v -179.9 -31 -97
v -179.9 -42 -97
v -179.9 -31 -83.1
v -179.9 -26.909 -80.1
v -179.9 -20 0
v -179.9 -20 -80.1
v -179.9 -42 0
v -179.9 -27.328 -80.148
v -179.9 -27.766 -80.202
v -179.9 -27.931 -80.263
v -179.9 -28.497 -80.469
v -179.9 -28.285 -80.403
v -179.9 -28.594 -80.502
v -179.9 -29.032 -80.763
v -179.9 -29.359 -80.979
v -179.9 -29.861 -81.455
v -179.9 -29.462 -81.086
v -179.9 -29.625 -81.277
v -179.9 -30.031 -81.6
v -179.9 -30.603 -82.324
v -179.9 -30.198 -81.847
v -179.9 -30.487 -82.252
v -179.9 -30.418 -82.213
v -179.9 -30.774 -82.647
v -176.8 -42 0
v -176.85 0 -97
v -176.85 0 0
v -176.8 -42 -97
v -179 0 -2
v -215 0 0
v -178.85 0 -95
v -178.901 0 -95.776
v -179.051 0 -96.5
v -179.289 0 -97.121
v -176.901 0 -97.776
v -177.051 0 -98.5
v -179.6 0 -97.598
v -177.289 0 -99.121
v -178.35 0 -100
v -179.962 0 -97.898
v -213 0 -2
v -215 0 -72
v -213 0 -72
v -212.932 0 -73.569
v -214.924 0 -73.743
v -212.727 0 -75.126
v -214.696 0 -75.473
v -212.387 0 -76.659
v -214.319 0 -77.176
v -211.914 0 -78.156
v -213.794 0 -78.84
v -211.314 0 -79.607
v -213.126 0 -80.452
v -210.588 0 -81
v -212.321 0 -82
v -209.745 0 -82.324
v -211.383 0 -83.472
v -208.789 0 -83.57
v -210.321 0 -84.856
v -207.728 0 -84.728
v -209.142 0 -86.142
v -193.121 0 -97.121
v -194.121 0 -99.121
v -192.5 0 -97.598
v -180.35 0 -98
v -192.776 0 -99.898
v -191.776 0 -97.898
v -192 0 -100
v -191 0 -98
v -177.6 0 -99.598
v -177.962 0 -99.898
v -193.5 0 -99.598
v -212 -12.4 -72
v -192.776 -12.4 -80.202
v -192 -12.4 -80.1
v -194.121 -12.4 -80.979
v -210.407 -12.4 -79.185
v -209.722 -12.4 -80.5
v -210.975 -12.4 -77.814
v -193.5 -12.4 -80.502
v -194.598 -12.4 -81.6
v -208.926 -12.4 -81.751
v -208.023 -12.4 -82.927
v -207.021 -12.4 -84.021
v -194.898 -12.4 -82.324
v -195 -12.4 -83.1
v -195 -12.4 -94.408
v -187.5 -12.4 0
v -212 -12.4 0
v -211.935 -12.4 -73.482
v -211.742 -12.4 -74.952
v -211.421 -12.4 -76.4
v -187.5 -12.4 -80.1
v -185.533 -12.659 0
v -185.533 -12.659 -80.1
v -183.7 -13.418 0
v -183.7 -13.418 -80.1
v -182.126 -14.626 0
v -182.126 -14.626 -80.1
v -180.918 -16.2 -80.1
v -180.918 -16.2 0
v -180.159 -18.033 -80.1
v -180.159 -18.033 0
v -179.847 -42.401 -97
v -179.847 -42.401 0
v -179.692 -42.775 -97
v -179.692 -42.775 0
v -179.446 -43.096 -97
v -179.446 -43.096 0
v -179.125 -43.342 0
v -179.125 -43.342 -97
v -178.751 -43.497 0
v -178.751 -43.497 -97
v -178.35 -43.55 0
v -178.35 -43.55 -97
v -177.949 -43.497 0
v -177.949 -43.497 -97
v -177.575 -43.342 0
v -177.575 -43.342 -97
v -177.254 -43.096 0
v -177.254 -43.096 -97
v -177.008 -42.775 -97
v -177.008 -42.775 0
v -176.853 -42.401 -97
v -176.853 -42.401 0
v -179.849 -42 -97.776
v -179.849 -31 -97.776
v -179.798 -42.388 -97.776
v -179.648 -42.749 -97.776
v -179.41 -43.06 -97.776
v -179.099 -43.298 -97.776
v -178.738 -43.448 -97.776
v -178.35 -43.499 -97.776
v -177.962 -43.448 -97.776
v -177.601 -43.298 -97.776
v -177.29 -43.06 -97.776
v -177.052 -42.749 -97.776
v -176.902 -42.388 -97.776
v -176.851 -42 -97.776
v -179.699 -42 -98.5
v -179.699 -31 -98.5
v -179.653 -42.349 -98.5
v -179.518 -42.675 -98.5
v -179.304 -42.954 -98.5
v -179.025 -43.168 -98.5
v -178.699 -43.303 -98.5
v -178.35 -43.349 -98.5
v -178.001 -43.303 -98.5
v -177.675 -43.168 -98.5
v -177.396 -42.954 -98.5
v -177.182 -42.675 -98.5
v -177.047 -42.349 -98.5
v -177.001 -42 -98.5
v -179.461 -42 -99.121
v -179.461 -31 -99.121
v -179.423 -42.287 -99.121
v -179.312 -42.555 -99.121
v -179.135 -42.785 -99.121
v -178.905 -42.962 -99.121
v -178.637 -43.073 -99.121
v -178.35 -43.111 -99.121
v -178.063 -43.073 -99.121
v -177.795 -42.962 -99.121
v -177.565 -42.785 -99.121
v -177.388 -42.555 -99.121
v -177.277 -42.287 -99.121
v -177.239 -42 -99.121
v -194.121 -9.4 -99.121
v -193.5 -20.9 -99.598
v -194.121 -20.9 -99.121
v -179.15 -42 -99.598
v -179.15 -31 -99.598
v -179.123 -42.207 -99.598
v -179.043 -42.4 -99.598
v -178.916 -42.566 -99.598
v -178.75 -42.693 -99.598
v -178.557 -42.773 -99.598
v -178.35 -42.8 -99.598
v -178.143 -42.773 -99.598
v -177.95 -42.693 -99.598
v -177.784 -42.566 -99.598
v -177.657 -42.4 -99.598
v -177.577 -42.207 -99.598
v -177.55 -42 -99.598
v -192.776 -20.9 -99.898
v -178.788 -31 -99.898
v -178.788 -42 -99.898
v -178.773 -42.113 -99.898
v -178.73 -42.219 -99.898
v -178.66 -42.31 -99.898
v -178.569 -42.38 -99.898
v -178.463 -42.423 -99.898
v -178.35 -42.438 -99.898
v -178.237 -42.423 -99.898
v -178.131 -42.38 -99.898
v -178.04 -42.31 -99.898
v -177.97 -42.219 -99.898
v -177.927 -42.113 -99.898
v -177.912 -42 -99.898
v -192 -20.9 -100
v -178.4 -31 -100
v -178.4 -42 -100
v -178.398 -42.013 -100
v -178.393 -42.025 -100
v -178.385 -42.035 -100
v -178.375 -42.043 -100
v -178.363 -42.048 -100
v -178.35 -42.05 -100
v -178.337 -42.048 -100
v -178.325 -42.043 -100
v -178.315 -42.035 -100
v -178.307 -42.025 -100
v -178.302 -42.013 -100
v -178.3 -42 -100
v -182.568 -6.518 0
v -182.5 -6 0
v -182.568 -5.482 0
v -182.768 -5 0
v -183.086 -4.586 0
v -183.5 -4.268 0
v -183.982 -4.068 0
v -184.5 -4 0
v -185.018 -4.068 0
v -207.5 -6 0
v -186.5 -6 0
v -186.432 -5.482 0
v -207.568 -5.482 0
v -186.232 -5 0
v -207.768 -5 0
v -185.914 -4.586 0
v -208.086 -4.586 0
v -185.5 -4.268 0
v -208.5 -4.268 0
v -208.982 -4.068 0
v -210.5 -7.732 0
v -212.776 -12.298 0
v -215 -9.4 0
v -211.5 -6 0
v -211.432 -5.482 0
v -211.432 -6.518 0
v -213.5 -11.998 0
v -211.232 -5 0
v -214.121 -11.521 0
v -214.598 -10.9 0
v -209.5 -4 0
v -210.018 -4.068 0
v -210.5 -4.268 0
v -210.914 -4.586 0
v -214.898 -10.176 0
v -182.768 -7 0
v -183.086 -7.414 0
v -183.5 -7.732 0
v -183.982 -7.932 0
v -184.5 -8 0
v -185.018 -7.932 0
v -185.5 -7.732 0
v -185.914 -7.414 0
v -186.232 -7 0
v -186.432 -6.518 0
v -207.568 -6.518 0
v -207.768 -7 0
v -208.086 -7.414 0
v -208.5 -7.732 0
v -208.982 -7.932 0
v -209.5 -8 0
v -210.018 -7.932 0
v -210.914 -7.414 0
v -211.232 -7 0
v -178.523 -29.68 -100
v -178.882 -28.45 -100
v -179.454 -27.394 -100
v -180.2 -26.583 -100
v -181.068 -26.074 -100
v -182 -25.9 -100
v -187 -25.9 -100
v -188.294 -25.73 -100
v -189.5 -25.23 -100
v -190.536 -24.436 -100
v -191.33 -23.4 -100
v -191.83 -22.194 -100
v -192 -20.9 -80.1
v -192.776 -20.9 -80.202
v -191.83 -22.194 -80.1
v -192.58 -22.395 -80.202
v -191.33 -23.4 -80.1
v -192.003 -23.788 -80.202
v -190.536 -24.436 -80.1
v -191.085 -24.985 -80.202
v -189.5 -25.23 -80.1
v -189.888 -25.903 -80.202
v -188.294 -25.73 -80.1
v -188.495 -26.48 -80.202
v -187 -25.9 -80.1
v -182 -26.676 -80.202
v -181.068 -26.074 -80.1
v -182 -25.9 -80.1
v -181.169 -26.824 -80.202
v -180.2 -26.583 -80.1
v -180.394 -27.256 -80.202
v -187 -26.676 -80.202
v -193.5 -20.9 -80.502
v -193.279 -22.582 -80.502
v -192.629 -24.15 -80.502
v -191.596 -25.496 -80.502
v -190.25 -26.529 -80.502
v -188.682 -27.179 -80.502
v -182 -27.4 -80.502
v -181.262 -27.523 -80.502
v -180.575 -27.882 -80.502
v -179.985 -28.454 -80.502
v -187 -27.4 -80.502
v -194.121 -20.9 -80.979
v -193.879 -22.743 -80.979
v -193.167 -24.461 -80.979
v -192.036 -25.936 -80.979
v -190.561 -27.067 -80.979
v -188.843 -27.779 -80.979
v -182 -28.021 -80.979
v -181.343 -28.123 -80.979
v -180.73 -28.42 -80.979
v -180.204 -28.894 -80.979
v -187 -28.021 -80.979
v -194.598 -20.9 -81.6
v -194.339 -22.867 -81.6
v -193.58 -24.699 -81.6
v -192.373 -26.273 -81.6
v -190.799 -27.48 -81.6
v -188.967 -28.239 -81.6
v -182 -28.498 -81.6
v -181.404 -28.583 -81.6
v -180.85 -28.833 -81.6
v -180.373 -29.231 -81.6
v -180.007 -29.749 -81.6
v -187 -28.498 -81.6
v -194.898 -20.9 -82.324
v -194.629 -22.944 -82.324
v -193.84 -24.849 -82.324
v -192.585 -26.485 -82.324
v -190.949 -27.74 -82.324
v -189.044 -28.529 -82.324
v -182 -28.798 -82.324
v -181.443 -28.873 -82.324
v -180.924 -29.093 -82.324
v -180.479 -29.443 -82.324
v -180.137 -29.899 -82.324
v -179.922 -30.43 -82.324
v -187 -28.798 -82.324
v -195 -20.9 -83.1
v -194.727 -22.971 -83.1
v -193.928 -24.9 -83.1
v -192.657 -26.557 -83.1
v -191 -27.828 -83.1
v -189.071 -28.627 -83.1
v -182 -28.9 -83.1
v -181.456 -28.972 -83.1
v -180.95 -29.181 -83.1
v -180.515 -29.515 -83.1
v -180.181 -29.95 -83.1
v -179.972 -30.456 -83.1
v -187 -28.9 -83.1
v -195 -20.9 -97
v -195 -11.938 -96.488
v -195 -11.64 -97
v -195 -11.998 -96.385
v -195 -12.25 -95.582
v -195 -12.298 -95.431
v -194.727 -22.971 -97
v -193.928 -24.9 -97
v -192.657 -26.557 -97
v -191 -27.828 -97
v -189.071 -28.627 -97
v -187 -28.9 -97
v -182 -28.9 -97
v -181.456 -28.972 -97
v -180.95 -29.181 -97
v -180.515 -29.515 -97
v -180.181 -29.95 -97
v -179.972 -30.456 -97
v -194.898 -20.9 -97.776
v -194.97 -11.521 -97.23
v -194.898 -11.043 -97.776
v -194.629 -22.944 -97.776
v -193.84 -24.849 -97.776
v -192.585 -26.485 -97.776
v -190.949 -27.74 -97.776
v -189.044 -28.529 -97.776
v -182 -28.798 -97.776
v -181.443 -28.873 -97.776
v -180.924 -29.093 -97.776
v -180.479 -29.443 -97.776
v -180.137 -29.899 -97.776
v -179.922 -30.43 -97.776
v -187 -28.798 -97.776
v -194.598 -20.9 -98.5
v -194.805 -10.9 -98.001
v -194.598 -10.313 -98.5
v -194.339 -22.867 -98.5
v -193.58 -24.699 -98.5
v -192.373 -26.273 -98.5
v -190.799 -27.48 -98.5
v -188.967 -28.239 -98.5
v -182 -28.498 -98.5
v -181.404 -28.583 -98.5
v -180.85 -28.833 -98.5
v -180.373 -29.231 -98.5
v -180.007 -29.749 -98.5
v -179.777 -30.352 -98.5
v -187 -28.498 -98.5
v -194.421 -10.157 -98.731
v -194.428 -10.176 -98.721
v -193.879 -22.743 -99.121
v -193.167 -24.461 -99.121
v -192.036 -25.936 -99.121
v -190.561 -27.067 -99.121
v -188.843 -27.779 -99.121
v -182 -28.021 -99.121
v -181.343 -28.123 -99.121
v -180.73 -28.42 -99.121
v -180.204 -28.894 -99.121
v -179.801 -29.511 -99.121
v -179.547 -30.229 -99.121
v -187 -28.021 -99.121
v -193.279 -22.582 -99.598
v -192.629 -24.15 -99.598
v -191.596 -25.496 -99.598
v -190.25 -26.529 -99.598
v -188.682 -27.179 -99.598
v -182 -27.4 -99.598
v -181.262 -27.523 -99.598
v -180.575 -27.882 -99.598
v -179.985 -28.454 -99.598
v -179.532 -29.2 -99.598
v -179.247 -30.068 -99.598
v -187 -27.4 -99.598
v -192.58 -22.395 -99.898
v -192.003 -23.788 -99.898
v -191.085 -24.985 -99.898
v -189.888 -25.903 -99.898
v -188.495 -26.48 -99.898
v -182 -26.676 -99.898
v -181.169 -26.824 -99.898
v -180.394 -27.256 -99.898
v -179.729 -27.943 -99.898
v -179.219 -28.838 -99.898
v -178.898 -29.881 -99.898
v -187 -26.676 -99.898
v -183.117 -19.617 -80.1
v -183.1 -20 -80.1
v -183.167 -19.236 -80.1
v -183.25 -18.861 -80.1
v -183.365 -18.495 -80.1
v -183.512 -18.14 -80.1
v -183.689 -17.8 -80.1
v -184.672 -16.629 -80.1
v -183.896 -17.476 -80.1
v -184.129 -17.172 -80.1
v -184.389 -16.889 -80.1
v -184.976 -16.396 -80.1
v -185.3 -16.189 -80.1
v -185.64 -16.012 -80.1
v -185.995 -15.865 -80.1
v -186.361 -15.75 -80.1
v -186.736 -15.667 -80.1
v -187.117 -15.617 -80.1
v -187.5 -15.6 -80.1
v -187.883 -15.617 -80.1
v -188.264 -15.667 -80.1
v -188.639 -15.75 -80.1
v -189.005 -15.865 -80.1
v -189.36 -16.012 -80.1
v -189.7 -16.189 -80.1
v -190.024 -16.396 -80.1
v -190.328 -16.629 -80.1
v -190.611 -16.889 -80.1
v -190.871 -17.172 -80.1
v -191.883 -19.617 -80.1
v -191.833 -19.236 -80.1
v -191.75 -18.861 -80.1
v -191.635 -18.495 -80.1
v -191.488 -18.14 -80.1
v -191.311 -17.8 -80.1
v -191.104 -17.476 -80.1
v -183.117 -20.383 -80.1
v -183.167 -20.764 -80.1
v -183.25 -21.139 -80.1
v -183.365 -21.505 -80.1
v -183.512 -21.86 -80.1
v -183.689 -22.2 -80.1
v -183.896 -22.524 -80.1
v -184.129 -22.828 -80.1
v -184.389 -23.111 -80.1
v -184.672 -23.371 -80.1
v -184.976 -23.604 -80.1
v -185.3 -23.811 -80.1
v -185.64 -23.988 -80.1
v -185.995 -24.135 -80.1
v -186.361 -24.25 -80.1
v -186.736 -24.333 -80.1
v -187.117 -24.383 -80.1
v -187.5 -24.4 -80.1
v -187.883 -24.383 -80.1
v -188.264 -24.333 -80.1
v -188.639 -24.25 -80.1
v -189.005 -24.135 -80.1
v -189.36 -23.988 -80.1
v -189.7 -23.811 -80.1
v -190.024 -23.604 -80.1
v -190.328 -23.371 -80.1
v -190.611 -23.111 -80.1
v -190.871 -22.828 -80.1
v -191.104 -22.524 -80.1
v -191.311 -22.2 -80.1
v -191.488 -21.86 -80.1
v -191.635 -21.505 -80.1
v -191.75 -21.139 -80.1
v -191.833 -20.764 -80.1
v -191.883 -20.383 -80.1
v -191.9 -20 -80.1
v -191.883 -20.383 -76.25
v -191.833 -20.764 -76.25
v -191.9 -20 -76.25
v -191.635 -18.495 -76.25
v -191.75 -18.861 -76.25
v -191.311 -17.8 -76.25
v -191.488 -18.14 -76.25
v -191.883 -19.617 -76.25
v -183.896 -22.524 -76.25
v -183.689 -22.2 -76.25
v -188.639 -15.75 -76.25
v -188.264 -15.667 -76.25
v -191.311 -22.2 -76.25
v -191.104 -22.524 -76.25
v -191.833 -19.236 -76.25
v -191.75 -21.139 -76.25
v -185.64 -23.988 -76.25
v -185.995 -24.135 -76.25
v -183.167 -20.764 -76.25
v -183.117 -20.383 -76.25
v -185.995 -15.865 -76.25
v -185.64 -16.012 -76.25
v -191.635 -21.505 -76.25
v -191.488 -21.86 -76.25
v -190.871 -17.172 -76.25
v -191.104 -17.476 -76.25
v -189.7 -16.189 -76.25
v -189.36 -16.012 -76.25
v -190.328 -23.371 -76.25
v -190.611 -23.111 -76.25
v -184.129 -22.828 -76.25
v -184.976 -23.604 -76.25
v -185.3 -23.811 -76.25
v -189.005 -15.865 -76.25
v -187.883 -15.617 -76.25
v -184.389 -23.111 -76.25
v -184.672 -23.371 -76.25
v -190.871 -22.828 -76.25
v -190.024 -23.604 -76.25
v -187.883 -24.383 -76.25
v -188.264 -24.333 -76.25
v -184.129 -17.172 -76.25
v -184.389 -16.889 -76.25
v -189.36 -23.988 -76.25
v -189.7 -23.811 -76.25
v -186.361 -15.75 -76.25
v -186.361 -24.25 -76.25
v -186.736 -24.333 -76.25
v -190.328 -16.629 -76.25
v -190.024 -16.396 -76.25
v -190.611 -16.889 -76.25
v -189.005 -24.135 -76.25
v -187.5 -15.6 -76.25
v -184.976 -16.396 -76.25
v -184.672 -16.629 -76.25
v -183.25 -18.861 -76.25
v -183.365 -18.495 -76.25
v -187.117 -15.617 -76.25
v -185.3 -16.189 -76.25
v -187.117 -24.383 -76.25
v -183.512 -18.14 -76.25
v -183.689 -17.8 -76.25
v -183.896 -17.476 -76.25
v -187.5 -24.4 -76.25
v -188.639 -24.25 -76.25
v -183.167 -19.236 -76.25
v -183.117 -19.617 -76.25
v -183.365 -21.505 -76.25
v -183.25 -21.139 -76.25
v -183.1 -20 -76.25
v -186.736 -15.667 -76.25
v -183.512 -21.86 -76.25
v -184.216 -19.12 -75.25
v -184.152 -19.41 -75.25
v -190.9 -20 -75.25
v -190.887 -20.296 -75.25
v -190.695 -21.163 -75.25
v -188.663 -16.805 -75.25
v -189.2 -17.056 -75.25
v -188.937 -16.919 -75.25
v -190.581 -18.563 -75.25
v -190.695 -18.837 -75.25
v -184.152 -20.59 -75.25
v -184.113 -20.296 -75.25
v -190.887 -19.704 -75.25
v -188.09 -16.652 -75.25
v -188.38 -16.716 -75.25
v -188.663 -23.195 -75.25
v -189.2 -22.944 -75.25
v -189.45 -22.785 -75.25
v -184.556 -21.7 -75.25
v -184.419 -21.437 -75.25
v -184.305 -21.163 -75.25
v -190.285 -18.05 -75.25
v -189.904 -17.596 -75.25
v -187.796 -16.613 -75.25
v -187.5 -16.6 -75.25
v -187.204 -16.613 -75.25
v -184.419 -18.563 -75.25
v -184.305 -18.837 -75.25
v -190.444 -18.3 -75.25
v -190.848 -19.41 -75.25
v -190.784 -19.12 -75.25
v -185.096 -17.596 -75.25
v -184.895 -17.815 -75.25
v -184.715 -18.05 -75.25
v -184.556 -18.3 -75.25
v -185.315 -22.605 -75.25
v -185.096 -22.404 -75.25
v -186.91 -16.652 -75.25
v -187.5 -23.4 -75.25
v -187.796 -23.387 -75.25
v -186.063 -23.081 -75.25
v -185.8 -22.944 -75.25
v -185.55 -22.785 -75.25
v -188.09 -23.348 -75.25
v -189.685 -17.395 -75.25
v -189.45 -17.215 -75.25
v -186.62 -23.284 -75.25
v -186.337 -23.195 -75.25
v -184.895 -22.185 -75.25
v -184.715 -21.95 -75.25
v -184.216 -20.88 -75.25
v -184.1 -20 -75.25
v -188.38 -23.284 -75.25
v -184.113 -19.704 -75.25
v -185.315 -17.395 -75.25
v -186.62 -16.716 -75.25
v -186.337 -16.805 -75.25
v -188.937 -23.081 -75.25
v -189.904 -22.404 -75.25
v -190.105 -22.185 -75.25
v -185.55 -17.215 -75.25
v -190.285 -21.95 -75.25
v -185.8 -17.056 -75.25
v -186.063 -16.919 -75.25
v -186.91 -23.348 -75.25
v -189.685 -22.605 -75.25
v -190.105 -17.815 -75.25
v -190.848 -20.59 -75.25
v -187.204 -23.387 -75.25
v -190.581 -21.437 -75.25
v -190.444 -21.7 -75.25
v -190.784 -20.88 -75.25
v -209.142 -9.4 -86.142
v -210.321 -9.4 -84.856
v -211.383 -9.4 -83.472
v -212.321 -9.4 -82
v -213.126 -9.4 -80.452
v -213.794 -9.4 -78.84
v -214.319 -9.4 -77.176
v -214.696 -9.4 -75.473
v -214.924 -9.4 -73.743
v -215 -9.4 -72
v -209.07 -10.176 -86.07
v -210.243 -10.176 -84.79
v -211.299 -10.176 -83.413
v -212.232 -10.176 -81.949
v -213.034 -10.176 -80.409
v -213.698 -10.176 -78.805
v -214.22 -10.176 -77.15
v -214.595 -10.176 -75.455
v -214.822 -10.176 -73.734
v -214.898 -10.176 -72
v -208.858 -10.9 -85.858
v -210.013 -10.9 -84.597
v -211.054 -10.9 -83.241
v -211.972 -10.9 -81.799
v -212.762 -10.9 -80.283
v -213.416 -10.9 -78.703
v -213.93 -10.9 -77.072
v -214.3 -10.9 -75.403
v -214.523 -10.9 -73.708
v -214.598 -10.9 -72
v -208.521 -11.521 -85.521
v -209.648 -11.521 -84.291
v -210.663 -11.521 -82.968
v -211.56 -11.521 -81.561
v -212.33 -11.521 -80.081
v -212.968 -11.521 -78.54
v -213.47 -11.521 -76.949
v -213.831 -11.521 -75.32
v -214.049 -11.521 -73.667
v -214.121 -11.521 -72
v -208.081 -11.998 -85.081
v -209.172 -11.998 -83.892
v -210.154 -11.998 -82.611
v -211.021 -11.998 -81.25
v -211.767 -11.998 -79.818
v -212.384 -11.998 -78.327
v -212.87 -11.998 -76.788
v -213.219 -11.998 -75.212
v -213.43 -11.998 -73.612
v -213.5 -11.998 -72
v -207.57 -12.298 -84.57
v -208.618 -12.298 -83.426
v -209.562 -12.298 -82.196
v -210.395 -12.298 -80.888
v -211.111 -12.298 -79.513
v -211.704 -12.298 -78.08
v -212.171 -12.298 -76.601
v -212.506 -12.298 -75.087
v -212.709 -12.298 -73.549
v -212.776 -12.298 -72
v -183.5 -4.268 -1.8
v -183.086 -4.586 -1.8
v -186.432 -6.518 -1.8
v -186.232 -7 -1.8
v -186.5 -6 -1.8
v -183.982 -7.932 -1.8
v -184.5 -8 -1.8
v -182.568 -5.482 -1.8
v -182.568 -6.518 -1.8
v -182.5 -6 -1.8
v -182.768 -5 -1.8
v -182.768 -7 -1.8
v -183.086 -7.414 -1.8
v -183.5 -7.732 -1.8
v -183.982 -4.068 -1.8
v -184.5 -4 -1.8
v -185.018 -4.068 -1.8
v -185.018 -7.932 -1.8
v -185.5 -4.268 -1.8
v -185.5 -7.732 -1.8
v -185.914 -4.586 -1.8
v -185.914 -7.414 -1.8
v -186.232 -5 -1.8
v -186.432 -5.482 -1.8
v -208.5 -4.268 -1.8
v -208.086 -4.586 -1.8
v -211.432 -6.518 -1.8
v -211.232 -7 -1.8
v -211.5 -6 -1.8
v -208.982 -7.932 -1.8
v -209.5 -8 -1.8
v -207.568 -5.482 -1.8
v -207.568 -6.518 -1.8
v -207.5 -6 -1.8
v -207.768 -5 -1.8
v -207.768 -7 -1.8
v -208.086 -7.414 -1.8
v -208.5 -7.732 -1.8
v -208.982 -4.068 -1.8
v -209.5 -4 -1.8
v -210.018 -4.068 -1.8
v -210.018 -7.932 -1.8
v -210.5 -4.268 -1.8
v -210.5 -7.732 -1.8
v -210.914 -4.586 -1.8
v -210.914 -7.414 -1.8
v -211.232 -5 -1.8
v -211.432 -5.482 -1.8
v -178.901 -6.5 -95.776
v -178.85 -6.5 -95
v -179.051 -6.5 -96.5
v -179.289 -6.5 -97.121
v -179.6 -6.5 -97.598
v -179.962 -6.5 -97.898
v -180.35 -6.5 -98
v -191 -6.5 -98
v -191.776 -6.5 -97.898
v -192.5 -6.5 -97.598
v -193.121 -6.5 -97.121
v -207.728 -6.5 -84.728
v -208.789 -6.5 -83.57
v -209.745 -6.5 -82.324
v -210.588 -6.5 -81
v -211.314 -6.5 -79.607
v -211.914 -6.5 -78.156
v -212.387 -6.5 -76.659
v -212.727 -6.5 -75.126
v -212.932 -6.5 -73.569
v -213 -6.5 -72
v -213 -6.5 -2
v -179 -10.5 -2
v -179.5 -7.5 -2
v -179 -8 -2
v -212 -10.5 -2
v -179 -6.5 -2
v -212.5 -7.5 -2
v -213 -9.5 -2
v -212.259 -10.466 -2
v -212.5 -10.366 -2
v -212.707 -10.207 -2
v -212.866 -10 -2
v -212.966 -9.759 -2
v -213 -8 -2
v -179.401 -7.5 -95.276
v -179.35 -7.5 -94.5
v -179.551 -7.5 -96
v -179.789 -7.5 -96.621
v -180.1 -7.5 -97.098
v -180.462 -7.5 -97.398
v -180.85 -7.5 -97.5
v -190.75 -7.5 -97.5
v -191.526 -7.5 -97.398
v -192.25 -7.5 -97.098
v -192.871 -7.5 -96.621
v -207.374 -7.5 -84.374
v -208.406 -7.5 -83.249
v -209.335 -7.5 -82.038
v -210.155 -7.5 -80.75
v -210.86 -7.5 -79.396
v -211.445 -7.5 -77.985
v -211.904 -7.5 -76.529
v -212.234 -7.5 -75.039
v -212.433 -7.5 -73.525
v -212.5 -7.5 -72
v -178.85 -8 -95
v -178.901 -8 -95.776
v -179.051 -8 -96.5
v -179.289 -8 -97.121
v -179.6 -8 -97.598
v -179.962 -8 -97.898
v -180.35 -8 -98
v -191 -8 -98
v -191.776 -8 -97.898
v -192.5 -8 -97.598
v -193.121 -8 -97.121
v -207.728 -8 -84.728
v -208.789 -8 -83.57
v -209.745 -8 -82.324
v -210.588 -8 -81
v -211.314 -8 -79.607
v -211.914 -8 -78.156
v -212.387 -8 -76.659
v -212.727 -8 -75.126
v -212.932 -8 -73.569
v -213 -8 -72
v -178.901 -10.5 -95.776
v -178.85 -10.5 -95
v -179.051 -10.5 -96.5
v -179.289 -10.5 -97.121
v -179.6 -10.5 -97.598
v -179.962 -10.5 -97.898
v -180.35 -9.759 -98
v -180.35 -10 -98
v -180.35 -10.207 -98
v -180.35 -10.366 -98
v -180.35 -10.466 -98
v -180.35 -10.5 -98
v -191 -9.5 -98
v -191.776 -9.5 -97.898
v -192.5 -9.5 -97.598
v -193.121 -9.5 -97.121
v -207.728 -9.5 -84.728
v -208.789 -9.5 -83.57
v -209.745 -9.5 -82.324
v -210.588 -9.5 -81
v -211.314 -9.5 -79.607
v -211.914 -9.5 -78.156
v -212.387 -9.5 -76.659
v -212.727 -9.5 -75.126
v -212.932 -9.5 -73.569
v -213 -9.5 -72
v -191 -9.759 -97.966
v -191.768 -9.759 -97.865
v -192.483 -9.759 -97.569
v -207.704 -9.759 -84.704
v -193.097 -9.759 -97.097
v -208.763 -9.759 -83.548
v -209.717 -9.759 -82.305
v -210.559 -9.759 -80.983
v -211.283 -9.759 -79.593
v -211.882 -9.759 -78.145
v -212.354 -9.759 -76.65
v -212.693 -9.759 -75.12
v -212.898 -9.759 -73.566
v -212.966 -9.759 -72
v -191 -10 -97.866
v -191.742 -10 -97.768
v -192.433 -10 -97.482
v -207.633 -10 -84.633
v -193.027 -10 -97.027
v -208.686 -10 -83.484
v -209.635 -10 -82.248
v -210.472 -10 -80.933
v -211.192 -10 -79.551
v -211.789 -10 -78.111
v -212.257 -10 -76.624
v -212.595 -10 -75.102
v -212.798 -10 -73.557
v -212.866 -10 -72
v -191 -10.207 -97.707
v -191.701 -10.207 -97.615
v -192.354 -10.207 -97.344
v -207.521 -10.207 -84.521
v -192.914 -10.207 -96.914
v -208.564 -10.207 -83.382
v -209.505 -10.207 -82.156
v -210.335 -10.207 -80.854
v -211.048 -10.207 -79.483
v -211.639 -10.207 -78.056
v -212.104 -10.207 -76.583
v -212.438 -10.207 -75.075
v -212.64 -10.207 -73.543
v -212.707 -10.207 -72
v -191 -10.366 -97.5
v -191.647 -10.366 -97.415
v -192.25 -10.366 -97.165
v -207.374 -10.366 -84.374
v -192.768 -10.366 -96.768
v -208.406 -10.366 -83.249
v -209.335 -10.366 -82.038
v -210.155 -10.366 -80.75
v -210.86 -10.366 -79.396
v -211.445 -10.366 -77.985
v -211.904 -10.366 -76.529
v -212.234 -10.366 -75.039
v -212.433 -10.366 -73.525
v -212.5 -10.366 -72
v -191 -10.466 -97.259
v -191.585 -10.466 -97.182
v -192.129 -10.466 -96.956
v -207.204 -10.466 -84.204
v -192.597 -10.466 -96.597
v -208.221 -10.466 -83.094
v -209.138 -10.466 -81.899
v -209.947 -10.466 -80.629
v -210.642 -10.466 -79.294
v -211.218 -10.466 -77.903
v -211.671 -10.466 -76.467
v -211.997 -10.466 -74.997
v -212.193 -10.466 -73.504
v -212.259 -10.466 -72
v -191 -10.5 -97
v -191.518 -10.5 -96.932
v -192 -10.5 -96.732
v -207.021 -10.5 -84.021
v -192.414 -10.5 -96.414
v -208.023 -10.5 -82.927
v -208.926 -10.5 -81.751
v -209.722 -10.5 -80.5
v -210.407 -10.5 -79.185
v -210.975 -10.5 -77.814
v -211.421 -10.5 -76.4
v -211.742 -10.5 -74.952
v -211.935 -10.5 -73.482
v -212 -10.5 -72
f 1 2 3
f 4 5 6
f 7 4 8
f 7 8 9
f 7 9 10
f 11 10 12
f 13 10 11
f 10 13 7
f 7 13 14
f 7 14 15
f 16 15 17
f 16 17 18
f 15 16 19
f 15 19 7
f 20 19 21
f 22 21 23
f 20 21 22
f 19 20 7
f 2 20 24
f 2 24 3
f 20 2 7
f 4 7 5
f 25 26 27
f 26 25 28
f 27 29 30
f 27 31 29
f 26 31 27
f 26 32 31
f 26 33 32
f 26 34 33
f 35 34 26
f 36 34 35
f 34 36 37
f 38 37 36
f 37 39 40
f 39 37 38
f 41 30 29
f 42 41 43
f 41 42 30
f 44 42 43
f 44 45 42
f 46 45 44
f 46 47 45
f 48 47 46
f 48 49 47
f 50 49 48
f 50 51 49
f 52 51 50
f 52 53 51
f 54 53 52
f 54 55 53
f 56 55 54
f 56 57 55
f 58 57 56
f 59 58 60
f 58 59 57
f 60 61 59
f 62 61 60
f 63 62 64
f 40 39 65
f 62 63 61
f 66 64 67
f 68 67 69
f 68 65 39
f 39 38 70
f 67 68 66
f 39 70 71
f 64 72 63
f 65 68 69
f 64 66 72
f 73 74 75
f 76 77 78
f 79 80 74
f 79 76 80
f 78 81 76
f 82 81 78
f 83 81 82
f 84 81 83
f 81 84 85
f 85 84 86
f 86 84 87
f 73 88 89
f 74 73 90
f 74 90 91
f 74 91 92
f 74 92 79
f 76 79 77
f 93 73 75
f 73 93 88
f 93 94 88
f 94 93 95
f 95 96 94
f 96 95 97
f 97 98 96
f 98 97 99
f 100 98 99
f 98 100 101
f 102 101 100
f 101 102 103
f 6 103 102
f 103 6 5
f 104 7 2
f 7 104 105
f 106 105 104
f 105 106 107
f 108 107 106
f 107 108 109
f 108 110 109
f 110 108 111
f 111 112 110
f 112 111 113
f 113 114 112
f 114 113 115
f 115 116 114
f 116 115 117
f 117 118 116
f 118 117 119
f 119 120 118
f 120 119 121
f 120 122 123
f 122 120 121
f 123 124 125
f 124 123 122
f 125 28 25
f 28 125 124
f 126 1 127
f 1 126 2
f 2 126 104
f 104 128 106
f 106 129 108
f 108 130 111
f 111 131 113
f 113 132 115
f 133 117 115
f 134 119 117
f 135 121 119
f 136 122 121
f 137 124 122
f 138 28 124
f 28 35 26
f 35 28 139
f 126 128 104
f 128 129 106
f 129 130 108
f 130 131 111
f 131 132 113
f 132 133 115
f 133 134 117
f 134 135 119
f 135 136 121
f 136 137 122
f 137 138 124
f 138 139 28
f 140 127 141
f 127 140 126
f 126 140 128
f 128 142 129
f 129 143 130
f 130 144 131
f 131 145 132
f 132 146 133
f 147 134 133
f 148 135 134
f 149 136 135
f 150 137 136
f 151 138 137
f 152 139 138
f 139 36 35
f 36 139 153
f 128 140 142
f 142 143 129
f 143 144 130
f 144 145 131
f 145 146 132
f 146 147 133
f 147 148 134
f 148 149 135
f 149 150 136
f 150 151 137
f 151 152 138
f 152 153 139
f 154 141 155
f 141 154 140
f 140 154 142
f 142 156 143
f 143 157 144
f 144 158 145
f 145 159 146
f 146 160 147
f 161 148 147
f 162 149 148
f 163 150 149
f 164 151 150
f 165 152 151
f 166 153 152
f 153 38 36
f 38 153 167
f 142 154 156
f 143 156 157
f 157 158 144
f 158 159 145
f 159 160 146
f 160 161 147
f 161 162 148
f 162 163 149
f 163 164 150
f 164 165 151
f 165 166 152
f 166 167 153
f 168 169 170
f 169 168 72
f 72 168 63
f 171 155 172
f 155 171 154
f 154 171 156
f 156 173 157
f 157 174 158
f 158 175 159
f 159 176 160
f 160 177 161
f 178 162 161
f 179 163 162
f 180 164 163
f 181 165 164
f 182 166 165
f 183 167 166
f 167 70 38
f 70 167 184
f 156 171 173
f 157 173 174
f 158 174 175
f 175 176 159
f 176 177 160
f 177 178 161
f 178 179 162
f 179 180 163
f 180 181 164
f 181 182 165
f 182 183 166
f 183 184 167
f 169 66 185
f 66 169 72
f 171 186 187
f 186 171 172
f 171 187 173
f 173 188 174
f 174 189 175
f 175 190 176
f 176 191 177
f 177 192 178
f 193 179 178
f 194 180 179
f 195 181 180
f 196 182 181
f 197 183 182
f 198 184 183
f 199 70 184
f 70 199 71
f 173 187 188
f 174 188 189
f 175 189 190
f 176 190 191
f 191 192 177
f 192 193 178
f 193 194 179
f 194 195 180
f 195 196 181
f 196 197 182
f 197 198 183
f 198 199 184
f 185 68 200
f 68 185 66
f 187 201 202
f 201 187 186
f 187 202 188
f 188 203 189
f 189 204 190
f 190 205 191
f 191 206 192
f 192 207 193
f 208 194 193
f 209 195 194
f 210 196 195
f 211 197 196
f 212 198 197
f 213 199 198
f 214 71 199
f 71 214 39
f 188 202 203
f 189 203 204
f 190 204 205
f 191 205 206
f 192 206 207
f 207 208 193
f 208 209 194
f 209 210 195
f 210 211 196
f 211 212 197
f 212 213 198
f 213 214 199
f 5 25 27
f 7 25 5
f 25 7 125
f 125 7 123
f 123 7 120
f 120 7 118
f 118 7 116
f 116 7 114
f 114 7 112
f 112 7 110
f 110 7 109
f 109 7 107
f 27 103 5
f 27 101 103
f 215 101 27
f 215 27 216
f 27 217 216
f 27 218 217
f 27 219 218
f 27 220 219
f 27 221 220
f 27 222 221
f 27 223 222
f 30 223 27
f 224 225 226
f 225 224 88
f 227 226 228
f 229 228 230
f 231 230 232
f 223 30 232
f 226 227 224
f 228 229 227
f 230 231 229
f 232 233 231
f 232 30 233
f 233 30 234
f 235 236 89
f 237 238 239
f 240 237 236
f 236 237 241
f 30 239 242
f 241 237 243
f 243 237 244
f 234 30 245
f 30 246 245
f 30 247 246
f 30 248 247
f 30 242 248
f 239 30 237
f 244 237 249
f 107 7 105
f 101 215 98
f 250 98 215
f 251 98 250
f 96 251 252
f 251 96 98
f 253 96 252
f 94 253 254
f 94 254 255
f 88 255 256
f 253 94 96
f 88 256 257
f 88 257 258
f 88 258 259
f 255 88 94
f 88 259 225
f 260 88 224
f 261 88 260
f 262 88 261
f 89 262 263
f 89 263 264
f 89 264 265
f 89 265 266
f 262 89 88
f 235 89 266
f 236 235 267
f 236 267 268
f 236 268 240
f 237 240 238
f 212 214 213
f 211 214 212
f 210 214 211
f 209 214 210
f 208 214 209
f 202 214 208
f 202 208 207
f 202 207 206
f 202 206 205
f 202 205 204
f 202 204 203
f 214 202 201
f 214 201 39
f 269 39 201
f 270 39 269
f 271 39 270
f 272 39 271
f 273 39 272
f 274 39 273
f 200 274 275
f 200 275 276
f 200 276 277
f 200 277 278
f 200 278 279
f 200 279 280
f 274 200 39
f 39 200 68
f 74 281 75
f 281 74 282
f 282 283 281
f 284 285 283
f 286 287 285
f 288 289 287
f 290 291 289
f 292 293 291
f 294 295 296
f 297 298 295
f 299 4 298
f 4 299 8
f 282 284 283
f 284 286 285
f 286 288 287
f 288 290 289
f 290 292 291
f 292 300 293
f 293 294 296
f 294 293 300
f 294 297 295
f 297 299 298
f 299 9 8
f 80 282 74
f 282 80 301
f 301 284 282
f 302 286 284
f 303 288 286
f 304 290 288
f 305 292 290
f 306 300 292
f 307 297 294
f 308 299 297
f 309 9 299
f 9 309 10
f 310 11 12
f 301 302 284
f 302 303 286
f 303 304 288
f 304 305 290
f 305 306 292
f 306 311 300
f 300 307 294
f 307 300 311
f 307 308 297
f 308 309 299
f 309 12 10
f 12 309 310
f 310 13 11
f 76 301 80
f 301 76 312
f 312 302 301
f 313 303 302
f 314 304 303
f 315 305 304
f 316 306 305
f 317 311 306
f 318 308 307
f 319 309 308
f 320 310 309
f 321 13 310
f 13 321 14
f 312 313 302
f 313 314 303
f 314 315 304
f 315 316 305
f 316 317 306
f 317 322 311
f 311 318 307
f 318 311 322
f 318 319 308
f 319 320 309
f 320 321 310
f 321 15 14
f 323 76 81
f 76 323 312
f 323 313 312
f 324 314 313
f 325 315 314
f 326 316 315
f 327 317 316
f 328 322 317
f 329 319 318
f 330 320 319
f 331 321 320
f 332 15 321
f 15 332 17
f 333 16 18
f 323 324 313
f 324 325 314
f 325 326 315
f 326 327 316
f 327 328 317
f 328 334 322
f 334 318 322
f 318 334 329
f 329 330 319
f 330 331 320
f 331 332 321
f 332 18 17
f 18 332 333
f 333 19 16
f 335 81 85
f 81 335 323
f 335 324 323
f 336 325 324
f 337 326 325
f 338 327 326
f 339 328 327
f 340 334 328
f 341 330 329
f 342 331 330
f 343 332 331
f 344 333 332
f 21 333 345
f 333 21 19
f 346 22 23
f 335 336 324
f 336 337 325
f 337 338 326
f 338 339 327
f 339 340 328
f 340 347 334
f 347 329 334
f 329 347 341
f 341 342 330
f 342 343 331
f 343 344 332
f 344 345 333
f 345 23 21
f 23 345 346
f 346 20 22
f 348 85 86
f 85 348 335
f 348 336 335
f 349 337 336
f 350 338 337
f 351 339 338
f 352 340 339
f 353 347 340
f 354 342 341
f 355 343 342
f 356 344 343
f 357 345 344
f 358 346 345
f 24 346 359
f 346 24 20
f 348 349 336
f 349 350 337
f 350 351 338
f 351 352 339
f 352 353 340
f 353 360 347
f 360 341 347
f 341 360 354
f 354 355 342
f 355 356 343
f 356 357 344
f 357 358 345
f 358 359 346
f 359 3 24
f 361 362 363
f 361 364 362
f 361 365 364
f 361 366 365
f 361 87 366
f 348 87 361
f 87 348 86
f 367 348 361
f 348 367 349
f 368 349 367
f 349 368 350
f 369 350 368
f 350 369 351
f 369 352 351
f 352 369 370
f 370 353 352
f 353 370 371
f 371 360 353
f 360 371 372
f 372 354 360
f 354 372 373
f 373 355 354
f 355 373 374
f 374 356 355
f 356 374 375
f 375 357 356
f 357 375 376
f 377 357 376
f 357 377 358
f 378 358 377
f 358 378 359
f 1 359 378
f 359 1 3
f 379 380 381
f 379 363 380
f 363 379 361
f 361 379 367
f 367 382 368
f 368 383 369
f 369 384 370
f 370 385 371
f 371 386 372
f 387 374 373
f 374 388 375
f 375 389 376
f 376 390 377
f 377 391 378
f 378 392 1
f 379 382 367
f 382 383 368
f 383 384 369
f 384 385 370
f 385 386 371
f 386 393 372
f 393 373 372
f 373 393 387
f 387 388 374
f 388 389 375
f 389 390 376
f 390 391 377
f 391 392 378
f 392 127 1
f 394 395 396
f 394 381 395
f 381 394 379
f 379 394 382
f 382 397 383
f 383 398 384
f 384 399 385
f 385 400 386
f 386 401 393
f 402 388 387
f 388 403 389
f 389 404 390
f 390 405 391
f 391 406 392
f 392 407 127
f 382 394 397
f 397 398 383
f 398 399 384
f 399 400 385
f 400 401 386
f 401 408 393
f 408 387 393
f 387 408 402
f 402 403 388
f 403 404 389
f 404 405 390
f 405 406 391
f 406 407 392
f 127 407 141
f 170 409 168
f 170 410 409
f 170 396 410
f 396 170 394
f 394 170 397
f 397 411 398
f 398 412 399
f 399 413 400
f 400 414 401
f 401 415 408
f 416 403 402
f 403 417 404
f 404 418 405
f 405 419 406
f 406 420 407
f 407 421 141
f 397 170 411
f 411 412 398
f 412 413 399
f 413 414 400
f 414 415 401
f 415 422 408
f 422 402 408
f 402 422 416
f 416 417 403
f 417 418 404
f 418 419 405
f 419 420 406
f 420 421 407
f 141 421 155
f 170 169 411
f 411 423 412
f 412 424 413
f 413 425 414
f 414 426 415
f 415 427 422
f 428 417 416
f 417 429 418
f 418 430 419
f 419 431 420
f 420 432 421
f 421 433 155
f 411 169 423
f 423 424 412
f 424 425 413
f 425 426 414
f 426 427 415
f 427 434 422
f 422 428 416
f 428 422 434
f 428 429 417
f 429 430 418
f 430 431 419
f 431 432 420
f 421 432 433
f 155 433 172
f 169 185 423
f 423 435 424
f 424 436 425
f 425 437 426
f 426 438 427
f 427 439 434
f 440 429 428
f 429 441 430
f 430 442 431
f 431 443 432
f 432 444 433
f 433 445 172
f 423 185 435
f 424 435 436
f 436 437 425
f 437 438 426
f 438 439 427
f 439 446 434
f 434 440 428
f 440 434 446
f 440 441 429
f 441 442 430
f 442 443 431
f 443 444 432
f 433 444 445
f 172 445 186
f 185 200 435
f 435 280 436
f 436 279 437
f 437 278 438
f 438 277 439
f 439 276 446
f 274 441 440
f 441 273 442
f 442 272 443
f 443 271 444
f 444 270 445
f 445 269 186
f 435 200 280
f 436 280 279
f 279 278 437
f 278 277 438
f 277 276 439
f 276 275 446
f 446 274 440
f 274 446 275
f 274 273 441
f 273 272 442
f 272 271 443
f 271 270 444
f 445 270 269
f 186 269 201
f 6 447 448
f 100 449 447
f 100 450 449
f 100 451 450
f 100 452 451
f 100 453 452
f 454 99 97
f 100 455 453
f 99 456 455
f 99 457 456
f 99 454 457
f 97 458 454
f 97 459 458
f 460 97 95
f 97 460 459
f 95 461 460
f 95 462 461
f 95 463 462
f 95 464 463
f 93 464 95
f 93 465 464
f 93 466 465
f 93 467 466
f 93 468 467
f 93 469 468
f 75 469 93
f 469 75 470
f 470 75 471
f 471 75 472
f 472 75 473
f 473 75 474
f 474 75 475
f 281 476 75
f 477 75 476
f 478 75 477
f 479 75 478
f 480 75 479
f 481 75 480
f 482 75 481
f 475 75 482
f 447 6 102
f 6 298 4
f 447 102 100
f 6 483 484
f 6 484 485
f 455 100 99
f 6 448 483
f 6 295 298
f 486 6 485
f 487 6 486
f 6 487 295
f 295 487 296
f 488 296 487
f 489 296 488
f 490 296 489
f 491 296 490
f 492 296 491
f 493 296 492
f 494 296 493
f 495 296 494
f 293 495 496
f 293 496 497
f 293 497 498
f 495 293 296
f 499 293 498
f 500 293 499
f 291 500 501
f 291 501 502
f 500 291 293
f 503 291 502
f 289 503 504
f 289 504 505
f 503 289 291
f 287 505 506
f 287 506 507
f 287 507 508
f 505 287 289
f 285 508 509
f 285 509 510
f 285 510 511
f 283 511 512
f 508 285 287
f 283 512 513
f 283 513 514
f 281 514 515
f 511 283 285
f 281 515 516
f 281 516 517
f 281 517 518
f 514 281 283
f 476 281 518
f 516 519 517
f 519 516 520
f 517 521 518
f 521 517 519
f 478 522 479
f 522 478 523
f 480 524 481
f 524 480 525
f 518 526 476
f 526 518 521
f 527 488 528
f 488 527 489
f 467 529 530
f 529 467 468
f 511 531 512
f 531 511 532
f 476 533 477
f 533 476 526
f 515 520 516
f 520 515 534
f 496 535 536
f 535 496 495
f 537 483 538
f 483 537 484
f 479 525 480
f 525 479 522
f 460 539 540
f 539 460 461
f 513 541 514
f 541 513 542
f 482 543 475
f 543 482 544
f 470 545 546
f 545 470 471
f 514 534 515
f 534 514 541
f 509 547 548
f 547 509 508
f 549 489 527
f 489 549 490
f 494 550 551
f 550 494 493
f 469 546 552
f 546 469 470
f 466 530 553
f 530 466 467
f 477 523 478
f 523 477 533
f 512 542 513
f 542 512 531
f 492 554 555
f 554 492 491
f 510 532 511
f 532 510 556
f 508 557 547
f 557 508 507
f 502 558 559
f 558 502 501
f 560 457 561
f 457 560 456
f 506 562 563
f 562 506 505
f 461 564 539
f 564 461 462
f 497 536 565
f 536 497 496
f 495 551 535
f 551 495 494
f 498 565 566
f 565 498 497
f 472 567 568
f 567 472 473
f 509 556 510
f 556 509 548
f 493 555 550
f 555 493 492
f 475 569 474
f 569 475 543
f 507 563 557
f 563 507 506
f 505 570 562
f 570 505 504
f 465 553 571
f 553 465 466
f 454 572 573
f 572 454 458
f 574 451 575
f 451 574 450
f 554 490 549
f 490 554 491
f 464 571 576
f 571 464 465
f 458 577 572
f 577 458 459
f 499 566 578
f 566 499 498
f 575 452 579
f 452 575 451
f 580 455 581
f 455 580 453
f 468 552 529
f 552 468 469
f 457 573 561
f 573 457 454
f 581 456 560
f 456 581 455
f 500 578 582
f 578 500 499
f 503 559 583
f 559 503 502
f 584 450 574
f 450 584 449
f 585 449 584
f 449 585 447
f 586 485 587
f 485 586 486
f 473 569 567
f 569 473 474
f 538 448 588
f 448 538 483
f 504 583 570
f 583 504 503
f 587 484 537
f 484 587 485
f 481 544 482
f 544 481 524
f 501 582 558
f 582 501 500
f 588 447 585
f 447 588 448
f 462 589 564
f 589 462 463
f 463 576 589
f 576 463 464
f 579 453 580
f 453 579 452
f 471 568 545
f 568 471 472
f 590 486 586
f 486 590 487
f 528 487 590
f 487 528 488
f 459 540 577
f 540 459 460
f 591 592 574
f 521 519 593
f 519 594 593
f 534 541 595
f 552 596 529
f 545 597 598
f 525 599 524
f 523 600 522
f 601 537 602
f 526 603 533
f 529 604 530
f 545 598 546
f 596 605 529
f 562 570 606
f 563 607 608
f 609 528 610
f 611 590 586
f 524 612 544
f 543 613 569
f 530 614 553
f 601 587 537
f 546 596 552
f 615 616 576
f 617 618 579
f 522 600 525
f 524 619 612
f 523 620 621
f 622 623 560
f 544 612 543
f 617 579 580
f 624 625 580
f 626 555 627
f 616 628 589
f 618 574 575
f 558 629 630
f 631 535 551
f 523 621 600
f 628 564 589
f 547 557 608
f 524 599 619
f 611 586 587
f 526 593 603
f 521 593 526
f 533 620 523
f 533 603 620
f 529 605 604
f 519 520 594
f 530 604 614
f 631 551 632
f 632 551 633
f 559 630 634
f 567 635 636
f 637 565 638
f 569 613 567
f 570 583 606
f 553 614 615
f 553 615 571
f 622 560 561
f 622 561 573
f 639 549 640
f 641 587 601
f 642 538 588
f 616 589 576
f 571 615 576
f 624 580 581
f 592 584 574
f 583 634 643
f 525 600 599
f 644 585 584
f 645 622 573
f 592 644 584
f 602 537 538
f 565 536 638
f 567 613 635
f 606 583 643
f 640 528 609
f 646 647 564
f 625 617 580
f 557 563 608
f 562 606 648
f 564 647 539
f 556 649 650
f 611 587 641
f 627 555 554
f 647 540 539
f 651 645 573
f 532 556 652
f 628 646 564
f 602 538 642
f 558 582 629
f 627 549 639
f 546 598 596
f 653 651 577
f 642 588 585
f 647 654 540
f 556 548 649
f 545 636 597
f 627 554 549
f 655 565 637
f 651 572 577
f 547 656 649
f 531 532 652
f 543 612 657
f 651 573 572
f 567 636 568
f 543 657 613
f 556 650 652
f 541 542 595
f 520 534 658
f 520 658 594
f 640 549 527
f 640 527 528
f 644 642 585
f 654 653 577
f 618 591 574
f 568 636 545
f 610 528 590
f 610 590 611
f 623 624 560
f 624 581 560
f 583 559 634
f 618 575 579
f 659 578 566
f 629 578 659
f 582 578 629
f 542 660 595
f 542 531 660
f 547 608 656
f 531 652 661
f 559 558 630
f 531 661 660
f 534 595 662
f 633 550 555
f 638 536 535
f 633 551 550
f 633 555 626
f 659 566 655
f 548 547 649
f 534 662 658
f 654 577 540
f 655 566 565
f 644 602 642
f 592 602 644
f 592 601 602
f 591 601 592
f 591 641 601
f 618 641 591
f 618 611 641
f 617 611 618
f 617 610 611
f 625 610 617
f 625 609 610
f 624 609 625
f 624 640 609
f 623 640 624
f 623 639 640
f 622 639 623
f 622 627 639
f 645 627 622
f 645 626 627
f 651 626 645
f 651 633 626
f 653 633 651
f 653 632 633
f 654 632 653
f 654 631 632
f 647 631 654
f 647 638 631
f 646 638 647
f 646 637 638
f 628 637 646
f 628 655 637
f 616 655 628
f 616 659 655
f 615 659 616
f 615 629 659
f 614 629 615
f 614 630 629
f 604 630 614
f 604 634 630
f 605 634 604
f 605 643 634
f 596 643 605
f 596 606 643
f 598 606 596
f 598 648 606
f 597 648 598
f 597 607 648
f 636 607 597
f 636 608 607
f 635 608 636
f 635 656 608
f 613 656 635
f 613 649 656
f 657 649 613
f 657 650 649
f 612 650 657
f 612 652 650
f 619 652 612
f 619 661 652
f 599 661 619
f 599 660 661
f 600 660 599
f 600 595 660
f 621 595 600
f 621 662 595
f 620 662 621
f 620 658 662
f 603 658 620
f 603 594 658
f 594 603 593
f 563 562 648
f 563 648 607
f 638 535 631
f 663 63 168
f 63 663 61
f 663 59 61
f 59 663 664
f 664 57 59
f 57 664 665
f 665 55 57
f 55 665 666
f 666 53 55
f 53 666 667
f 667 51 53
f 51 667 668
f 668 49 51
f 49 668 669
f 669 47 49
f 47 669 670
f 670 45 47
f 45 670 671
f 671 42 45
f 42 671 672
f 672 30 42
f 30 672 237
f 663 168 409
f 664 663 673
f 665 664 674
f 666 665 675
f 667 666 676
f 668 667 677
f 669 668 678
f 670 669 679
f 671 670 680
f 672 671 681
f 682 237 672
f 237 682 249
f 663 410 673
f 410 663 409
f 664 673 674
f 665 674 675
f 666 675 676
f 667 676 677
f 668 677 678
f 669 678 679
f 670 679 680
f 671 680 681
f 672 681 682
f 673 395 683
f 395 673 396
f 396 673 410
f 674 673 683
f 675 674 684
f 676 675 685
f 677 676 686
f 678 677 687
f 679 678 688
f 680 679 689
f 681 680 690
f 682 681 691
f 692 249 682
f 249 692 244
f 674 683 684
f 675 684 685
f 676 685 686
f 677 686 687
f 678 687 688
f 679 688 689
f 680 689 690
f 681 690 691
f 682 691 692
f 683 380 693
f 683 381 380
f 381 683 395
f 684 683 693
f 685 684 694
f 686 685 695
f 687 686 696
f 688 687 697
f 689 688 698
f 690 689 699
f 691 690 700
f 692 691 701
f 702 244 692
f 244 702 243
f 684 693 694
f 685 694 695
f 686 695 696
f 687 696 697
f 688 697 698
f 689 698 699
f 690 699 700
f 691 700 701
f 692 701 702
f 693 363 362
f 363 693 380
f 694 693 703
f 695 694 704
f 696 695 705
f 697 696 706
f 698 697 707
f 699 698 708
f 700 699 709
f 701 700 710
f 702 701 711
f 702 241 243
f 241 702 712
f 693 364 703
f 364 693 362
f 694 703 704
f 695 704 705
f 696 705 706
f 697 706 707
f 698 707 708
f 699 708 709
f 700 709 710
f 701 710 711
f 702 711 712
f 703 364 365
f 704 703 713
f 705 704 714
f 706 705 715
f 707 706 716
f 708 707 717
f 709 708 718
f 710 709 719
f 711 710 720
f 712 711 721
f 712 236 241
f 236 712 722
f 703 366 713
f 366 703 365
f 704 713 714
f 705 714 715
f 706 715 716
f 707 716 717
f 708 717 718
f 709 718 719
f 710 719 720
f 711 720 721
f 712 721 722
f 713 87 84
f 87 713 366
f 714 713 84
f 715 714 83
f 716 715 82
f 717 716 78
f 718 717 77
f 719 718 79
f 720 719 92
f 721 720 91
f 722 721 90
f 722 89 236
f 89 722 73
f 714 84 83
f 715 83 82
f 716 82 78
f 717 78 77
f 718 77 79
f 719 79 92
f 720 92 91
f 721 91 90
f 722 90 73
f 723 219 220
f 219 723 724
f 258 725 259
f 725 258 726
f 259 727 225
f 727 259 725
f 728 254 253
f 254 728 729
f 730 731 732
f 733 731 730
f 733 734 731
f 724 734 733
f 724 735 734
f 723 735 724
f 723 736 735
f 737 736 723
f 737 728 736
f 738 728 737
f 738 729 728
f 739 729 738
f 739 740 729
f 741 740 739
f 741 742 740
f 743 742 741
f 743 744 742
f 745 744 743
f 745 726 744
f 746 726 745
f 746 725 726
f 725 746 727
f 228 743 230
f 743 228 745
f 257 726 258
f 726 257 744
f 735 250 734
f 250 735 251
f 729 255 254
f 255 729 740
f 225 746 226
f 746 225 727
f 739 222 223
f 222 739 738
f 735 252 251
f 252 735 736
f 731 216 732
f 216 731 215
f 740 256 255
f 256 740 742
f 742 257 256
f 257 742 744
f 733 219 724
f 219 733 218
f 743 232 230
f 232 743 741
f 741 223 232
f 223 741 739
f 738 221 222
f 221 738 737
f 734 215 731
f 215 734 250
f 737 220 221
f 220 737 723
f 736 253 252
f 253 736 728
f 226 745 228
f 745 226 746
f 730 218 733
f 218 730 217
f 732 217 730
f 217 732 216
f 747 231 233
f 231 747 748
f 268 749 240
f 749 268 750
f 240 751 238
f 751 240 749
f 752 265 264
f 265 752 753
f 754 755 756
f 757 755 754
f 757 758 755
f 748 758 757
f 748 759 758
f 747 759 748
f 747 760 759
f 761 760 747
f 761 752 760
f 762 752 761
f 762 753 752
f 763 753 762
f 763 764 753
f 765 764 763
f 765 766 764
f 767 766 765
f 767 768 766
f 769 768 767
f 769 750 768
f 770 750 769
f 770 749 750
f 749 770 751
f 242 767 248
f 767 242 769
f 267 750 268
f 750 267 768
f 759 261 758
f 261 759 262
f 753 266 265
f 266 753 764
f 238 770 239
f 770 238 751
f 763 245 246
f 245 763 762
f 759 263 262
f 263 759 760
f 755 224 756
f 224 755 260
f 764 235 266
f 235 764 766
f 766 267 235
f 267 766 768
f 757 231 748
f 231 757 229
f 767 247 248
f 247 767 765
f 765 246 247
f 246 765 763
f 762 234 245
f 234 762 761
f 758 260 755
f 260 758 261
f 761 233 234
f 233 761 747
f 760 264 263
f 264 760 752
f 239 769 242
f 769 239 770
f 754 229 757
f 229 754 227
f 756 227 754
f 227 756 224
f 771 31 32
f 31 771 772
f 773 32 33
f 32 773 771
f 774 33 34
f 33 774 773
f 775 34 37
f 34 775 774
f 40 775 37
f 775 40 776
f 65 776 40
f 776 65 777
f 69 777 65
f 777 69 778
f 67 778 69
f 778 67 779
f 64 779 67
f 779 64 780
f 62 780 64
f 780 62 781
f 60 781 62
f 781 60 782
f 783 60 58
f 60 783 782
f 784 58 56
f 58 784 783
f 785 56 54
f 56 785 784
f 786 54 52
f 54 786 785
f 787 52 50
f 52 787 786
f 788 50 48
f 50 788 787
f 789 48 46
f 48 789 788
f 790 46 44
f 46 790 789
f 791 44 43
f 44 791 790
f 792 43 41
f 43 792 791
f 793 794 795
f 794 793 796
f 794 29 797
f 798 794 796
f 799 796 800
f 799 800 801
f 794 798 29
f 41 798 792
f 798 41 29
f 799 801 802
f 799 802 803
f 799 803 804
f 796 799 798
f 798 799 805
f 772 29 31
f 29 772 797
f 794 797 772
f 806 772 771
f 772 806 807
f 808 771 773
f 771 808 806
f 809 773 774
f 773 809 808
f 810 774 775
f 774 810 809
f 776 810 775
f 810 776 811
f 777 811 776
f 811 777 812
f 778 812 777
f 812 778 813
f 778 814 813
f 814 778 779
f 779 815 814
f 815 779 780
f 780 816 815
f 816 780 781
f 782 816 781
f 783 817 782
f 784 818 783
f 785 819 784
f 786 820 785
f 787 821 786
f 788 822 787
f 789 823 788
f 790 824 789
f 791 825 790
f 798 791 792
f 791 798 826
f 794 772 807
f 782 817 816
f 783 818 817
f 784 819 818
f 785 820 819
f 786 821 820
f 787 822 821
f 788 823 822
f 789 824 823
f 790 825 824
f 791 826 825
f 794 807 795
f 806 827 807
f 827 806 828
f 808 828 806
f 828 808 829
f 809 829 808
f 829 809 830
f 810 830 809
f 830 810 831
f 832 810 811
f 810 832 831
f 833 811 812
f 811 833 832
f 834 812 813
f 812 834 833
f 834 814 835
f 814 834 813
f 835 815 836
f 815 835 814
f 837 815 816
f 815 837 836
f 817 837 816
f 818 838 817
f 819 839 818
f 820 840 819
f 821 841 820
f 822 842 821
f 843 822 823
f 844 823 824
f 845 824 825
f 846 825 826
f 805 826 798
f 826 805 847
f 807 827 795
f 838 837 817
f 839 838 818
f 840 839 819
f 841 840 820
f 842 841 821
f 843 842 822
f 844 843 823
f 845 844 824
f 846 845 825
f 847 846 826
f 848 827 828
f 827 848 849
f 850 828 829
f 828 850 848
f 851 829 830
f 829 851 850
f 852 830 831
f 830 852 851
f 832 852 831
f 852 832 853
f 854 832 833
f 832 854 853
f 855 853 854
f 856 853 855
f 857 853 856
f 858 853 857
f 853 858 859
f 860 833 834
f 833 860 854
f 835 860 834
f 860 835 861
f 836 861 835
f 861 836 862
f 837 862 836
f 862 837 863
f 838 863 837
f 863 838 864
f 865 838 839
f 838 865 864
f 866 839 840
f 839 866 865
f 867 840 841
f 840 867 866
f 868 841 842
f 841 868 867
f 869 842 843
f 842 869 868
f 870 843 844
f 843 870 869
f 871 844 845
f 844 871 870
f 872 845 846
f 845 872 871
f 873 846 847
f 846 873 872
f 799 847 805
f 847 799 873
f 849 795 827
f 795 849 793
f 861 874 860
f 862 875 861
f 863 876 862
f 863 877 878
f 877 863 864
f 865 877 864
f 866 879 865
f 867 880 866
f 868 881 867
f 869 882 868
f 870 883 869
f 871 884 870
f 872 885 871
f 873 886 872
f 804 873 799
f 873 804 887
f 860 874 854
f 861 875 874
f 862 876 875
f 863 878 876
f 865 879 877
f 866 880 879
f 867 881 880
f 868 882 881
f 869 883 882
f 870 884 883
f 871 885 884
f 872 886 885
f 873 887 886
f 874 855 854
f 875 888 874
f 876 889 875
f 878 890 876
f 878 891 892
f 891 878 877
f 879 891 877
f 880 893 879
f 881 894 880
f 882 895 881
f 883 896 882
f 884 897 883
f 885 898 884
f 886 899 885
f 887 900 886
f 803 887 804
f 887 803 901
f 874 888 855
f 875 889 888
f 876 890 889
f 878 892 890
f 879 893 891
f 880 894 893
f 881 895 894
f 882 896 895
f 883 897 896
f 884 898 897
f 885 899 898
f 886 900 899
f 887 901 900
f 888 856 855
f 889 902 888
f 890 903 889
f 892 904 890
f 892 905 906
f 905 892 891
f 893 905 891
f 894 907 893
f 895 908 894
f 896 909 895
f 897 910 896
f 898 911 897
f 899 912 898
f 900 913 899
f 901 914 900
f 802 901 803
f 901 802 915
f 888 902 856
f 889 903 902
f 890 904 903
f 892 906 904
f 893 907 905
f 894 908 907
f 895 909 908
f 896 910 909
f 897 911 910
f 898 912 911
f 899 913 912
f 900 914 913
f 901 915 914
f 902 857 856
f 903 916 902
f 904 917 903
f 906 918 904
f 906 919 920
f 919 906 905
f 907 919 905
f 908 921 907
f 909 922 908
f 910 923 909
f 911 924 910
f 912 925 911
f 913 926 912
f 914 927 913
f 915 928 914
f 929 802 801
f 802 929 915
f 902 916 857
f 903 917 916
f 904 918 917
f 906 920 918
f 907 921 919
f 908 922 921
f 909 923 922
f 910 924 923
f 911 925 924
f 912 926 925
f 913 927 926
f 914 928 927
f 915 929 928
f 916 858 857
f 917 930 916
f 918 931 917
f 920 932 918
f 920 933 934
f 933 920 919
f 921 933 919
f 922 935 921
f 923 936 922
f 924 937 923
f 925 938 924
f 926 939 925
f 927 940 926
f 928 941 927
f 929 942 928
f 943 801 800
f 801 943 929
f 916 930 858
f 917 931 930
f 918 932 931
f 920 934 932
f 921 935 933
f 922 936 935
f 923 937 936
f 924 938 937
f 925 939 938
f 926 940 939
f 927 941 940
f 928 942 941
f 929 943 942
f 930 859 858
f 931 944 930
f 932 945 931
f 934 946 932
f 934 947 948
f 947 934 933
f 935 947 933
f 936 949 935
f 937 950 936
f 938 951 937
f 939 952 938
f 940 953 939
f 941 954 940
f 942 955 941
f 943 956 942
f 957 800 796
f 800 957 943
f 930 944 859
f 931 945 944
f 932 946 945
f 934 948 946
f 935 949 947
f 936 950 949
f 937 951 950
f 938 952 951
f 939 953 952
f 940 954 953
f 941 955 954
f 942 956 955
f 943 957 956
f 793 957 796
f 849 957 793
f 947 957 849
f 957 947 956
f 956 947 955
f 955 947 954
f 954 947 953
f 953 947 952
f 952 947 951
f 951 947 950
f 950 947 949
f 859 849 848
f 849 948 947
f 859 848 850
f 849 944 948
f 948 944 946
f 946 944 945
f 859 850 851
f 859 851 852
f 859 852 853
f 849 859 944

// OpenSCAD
use <../neuro.scad>

rotate([90,0,0]) mirror([1,0,0]) hinge_r();
